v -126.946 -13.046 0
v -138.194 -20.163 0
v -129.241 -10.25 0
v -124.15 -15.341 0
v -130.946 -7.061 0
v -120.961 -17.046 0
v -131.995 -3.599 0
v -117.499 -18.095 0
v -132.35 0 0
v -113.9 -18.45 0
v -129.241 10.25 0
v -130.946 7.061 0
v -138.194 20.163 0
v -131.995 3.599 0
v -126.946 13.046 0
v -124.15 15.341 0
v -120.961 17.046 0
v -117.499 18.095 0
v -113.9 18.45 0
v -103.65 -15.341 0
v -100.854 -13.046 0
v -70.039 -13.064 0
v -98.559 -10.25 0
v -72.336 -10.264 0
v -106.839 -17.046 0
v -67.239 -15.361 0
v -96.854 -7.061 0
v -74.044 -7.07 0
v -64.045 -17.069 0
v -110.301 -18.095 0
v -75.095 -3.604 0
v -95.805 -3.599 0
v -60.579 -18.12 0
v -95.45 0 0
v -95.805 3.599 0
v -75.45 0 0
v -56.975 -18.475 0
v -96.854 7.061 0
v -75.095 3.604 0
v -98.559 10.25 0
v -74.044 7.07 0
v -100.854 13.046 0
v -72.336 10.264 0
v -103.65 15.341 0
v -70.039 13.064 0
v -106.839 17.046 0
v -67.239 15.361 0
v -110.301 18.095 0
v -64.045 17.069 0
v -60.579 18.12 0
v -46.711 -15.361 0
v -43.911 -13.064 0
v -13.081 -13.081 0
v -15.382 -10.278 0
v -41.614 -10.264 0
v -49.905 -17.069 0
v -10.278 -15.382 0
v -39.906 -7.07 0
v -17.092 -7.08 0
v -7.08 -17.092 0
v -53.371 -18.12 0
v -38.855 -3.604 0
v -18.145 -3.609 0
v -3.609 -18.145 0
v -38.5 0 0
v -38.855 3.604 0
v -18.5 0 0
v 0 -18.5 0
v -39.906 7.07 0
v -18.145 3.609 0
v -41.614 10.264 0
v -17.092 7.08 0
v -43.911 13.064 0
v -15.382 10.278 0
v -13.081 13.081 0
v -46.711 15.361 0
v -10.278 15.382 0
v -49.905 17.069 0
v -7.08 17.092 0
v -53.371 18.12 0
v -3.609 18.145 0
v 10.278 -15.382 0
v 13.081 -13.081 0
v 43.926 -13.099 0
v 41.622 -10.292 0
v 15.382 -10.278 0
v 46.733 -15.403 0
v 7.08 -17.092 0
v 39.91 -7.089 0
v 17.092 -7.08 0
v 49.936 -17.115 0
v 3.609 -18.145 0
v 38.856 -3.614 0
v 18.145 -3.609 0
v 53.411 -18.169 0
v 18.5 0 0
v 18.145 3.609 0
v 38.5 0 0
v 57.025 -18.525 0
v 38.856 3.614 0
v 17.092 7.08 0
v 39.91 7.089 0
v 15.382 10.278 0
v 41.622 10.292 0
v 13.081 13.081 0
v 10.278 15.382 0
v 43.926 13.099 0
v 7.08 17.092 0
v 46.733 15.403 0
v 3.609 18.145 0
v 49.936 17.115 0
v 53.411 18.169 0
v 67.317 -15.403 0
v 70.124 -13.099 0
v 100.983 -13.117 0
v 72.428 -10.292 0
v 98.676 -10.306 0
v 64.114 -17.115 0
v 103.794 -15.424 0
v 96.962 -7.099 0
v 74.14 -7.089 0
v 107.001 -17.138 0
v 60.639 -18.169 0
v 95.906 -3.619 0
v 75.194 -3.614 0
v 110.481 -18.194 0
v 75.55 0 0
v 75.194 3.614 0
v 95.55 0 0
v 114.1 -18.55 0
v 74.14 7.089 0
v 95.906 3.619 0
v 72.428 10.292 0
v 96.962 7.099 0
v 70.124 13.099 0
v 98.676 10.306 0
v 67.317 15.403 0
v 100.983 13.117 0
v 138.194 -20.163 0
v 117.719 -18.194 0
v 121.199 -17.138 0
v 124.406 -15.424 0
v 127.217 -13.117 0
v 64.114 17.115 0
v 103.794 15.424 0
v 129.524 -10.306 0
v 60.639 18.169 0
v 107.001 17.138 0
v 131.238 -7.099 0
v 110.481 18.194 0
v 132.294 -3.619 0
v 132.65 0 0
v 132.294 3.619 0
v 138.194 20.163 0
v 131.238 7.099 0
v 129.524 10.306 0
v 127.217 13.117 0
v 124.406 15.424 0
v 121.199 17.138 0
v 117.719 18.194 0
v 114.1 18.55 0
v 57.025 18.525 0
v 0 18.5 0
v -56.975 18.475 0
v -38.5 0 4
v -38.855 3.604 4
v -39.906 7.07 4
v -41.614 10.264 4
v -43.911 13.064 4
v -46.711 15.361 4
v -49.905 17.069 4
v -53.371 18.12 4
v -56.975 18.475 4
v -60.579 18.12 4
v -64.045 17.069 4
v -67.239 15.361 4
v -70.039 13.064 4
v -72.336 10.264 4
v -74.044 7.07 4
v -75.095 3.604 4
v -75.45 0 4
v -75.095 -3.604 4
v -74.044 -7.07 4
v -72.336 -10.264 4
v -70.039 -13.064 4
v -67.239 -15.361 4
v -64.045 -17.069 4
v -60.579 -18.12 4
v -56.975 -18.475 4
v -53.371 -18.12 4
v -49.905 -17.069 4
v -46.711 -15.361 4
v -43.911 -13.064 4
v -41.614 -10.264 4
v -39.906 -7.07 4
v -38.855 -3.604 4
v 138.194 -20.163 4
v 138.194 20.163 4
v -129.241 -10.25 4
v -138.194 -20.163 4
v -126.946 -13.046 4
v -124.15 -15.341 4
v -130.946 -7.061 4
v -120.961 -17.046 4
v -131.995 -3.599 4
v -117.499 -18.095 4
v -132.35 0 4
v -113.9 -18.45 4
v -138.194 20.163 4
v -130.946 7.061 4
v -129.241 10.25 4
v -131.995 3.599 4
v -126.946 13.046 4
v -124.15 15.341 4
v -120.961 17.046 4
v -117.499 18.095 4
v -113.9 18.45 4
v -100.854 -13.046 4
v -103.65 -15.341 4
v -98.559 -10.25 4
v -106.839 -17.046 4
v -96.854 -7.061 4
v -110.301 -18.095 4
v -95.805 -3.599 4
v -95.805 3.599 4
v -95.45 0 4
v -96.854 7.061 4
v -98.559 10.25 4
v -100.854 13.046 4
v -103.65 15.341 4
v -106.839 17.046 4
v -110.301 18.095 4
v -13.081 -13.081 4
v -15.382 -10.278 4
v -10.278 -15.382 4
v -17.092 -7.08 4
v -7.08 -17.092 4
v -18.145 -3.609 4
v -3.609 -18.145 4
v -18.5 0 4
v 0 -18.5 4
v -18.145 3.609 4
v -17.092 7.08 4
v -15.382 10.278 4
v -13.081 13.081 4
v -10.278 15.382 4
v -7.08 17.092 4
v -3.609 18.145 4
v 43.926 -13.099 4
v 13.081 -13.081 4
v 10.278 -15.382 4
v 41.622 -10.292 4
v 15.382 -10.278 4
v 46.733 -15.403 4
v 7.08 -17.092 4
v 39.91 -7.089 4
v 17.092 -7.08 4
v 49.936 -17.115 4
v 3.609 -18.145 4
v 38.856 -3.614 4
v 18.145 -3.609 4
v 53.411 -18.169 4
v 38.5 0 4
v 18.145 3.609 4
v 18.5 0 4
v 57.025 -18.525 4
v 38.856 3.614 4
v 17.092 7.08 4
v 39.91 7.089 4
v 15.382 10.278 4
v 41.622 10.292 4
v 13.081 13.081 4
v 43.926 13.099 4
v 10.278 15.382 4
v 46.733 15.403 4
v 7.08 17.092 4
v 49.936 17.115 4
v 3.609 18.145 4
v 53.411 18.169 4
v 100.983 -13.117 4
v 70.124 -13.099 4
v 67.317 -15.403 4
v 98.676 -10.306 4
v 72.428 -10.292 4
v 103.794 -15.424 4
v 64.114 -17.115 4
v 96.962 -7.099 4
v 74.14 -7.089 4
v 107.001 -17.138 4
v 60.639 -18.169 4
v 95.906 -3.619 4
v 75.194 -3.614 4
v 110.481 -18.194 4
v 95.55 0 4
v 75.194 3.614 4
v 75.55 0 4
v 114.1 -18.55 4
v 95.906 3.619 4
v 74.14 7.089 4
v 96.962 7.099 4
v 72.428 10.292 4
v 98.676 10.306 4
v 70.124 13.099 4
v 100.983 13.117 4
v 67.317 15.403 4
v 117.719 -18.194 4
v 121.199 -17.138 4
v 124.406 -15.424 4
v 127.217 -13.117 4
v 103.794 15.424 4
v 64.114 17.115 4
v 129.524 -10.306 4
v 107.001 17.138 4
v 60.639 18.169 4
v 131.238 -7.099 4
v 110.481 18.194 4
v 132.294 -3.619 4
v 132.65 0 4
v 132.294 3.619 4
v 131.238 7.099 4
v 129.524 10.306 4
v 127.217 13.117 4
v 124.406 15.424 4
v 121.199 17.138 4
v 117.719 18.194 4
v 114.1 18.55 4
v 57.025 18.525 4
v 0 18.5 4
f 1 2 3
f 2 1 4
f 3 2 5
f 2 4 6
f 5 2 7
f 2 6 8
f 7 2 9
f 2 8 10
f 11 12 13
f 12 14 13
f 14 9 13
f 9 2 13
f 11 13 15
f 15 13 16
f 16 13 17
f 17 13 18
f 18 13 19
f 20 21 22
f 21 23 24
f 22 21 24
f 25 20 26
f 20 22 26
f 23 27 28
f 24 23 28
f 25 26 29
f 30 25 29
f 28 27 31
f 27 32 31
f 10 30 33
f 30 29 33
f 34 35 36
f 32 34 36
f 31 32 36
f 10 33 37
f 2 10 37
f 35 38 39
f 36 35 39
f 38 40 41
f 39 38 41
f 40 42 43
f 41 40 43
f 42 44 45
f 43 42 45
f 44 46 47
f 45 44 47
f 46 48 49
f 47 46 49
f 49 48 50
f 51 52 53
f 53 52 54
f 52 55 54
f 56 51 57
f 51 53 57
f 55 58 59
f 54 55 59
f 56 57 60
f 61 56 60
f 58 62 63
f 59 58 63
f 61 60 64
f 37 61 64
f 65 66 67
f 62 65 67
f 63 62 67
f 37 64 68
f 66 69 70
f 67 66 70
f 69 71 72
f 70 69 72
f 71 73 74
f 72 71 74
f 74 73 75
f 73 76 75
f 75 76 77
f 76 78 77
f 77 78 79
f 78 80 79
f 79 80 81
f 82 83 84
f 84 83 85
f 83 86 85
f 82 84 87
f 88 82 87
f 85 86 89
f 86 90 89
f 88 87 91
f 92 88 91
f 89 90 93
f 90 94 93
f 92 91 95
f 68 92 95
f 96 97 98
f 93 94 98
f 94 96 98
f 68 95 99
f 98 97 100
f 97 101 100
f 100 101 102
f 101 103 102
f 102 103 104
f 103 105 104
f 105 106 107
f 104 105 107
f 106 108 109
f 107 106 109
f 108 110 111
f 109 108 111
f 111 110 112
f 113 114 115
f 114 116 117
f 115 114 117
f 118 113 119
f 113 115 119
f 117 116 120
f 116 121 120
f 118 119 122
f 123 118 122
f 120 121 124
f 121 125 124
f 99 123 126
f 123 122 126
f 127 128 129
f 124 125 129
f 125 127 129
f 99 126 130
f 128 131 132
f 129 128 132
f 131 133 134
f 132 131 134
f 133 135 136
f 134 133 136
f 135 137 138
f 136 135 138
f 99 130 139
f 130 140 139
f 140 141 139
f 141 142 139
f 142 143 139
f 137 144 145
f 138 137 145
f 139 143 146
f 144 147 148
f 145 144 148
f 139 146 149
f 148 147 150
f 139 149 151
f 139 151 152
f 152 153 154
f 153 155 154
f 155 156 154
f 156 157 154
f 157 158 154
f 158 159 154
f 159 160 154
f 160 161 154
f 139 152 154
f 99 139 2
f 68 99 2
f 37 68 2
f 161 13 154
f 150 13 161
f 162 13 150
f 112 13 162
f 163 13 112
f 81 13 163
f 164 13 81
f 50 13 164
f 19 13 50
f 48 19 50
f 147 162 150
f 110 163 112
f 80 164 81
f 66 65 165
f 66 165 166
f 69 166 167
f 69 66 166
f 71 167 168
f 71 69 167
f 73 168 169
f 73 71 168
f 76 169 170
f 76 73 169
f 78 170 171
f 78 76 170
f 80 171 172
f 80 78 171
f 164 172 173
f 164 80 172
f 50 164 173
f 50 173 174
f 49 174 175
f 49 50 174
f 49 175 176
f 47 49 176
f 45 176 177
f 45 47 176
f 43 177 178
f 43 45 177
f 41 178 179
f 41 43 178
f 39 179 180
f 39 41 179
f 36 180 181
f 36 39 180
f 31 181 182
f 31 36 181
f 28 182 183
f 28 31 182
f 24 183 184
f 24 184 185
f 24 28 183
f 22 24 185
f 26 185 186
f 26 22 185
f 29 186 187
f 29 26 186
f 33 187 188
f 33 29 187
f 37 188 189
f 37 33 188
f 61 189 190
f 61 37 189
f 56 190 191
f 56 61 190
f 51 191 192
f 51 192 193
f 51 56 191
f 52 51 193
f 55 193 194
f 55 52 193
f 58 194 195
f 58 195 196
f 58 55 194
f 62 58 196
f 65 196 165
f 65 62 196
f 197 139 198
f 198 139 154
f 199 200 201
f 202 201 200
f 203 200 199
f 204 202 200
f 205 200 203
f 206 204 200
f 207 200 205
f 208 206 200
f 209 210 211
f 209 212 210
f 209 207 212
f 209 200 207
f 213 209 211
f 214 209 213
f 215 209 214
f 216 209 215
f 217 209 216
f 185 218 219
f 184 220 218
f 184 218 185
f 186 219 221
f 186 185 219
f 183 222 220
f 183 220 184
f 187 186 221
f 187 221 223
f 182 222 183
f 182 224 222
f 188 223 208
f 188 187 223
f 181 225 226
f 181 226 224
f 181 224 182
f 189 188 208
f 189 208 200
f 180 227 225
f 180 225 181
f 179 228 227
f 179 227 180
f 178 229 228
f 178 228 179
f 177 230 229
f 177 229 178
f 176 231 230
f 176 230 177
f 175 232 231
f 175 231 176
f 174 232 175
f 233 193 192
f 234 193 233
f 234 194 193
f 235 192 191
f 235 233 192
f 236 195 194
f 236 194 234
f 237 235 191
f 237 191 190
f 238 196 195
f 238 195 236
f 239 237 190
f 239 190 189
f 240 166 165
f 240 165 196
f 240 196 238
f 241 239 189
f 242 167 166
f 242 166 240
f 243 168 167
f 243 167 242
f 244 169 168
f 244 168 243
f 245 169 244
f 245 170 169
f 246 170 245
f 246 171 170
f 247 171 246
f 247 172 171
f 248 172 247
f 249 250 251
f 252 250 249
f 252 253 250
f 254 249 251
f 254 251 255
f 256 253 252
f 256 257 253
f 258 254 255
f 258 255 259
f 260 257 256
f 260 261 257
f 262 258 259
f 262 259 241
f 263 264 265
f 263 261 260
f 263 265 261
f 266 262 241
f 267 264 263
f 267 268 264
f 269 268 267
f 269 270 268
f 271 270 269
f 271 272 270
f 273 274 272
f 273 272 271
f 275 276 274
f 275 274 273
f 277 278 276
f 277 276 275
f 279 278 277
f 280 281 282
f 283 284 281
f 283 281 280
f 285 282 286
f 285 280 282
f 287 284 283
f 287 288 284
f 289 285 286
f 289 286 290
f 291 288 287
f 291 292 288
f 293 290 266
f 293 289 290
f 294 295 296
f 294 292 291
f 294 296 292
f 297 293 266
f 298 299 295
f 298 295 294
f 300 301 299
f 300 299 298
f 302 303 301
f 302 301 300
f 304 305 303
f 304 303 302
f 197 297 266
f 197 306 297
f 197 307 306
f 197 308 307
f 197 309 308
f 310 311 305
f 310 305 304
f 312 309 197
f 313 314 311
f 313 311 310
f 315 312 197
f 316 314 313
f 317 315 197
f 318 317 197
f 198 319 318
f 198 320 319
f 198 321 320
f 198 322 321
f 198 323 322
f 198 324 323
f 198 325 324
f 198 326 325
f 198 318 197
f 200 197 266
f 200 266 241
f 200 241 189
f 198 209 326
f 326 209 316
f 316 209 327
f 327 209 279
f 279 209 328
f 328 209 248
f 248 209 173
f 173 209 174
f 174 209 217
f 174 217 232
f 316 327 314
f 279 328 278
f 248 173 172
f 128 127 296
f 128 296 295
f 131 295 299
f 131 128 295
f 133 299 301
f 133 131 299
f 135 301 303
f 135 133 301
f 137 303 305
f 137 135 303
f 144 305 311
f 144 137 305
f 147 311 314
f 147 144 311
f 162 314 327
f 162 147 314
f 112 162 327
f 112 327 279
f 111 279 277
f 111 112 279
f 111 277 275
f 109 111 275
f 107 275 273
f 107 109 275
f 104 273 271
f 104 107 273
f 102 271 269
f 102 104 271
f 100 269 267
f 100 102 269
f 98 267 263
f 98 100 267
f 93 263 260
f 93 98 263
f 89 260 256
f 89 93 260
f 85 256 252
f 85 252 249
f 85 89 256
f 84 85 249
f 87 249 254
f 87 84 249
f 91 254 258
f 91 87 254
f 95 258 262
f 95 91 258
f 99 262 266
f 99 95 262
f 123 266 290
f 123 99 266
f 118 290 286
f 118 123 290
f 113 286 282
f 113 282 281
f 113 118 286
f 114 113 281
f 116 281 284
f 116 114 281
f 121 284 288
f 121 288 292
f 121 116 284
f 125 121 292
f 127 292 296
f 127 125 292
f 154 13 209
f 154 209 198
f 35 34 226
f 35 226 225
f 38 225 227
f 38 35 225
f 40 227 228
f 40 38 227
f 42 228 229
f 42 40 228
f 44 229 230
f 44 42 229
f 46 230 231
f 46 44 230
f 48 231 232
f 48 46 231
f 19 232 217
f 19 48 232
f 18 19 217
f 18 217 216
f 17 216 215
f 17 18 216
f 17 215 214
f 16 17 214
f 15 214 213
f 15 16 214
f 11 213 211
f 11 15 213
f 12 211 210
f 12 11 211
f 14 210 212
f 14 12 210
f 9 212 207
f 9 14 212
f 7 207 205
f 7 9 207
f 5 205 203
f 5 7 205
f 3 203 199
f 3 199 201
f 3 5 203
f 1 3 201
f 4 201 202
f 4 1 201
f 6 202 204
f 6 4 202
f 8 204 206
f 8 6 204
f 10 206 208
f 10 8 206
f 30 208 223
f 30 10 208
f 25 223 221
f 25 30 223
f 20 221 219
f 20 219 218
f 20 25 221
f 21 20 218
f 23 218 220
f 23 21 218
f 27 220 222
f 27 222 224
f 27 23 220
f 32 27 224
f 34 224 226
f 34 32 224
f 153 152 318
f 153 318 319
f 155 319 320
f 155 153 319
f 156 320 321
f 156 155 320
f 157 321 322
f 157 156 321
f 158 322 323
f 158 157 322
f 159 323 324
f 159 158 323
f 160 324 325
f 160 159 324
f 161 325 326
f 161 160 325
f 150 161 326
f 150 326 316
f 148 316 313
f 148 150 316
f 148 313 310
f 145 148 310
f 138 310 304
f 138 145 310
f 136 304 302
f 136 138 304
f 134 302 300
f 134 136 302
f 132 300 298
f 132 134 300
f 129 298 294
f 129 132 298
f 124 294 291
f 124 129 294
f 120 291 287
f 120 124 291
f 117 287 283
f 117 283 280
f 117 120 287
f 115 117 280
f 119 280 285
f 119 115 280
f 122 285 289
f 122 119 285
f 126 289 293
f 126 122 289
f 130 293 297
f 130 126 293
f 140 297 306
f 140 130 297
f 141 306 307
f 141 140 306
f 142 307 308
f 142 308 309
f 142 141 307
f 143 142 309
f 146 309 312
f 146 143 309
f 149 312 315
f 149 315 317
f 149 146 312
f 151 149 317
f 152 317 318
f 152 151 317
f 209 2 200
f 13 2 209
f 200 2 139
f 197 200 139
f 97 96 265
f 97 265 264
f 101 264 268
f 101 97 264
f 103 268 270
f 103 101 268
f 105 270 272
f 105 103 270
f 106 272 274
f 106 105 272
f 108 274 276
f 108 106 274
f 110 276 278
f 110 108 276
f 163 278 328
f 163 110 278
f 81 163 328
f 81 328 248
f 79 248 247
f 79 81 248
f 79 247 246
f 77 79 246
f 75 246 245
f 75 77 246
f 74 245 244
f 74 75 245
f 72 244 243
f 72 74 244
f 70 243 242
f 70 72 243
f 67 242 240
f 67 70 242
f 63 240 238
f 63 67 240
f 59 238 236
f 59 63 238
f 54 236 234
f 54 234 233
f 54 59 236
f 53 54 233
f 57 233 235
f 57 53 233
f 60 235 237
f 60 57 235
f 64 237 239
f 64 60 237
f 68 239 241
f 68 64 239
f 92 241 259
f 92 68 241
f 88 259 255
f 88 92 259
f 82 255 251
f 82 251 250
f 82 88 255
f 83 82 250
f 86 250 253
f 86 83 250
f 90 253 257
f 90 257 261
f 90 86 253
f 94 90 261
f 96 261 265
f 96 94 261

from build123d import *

# Parameters (mm, degrees)
F0_W     = 276.38796
F0_H     = 40.325638
F0_R     = 18.45
F0_R_2   = 18.475
F0_R_3   = 18.5
F0_R_4   = 18.525
F0_R_5   = 18.55
F1_DEPTH = 4


with BuildPart() as f1:
    # F0 (on Top) → F1 (new body)
    with BuildSketch(Plane.XY):
        Rectangle(F0_W, F0_H)
        with Locations((-113.9, 0)):
            Circle(F0_R, mode=Mode.SUBTRACT)
        with Locations((-56.975, 0)):
            Circle(F0_R_2, mode=Mode.SUBTRACT)
        Circle(F0_R_3, mode=Mode.SUBTRACT)
        with Locations((57.025, 0)):
            Circle(F0_R_4, mode=Mode.SUBTRACT)
        with Locations((114.1, 0)):
            Circle(F0_R_5, mode=Mode.SUBTRACT)
    extrude(amount=F1_DEPTH)


solid = f1.part
